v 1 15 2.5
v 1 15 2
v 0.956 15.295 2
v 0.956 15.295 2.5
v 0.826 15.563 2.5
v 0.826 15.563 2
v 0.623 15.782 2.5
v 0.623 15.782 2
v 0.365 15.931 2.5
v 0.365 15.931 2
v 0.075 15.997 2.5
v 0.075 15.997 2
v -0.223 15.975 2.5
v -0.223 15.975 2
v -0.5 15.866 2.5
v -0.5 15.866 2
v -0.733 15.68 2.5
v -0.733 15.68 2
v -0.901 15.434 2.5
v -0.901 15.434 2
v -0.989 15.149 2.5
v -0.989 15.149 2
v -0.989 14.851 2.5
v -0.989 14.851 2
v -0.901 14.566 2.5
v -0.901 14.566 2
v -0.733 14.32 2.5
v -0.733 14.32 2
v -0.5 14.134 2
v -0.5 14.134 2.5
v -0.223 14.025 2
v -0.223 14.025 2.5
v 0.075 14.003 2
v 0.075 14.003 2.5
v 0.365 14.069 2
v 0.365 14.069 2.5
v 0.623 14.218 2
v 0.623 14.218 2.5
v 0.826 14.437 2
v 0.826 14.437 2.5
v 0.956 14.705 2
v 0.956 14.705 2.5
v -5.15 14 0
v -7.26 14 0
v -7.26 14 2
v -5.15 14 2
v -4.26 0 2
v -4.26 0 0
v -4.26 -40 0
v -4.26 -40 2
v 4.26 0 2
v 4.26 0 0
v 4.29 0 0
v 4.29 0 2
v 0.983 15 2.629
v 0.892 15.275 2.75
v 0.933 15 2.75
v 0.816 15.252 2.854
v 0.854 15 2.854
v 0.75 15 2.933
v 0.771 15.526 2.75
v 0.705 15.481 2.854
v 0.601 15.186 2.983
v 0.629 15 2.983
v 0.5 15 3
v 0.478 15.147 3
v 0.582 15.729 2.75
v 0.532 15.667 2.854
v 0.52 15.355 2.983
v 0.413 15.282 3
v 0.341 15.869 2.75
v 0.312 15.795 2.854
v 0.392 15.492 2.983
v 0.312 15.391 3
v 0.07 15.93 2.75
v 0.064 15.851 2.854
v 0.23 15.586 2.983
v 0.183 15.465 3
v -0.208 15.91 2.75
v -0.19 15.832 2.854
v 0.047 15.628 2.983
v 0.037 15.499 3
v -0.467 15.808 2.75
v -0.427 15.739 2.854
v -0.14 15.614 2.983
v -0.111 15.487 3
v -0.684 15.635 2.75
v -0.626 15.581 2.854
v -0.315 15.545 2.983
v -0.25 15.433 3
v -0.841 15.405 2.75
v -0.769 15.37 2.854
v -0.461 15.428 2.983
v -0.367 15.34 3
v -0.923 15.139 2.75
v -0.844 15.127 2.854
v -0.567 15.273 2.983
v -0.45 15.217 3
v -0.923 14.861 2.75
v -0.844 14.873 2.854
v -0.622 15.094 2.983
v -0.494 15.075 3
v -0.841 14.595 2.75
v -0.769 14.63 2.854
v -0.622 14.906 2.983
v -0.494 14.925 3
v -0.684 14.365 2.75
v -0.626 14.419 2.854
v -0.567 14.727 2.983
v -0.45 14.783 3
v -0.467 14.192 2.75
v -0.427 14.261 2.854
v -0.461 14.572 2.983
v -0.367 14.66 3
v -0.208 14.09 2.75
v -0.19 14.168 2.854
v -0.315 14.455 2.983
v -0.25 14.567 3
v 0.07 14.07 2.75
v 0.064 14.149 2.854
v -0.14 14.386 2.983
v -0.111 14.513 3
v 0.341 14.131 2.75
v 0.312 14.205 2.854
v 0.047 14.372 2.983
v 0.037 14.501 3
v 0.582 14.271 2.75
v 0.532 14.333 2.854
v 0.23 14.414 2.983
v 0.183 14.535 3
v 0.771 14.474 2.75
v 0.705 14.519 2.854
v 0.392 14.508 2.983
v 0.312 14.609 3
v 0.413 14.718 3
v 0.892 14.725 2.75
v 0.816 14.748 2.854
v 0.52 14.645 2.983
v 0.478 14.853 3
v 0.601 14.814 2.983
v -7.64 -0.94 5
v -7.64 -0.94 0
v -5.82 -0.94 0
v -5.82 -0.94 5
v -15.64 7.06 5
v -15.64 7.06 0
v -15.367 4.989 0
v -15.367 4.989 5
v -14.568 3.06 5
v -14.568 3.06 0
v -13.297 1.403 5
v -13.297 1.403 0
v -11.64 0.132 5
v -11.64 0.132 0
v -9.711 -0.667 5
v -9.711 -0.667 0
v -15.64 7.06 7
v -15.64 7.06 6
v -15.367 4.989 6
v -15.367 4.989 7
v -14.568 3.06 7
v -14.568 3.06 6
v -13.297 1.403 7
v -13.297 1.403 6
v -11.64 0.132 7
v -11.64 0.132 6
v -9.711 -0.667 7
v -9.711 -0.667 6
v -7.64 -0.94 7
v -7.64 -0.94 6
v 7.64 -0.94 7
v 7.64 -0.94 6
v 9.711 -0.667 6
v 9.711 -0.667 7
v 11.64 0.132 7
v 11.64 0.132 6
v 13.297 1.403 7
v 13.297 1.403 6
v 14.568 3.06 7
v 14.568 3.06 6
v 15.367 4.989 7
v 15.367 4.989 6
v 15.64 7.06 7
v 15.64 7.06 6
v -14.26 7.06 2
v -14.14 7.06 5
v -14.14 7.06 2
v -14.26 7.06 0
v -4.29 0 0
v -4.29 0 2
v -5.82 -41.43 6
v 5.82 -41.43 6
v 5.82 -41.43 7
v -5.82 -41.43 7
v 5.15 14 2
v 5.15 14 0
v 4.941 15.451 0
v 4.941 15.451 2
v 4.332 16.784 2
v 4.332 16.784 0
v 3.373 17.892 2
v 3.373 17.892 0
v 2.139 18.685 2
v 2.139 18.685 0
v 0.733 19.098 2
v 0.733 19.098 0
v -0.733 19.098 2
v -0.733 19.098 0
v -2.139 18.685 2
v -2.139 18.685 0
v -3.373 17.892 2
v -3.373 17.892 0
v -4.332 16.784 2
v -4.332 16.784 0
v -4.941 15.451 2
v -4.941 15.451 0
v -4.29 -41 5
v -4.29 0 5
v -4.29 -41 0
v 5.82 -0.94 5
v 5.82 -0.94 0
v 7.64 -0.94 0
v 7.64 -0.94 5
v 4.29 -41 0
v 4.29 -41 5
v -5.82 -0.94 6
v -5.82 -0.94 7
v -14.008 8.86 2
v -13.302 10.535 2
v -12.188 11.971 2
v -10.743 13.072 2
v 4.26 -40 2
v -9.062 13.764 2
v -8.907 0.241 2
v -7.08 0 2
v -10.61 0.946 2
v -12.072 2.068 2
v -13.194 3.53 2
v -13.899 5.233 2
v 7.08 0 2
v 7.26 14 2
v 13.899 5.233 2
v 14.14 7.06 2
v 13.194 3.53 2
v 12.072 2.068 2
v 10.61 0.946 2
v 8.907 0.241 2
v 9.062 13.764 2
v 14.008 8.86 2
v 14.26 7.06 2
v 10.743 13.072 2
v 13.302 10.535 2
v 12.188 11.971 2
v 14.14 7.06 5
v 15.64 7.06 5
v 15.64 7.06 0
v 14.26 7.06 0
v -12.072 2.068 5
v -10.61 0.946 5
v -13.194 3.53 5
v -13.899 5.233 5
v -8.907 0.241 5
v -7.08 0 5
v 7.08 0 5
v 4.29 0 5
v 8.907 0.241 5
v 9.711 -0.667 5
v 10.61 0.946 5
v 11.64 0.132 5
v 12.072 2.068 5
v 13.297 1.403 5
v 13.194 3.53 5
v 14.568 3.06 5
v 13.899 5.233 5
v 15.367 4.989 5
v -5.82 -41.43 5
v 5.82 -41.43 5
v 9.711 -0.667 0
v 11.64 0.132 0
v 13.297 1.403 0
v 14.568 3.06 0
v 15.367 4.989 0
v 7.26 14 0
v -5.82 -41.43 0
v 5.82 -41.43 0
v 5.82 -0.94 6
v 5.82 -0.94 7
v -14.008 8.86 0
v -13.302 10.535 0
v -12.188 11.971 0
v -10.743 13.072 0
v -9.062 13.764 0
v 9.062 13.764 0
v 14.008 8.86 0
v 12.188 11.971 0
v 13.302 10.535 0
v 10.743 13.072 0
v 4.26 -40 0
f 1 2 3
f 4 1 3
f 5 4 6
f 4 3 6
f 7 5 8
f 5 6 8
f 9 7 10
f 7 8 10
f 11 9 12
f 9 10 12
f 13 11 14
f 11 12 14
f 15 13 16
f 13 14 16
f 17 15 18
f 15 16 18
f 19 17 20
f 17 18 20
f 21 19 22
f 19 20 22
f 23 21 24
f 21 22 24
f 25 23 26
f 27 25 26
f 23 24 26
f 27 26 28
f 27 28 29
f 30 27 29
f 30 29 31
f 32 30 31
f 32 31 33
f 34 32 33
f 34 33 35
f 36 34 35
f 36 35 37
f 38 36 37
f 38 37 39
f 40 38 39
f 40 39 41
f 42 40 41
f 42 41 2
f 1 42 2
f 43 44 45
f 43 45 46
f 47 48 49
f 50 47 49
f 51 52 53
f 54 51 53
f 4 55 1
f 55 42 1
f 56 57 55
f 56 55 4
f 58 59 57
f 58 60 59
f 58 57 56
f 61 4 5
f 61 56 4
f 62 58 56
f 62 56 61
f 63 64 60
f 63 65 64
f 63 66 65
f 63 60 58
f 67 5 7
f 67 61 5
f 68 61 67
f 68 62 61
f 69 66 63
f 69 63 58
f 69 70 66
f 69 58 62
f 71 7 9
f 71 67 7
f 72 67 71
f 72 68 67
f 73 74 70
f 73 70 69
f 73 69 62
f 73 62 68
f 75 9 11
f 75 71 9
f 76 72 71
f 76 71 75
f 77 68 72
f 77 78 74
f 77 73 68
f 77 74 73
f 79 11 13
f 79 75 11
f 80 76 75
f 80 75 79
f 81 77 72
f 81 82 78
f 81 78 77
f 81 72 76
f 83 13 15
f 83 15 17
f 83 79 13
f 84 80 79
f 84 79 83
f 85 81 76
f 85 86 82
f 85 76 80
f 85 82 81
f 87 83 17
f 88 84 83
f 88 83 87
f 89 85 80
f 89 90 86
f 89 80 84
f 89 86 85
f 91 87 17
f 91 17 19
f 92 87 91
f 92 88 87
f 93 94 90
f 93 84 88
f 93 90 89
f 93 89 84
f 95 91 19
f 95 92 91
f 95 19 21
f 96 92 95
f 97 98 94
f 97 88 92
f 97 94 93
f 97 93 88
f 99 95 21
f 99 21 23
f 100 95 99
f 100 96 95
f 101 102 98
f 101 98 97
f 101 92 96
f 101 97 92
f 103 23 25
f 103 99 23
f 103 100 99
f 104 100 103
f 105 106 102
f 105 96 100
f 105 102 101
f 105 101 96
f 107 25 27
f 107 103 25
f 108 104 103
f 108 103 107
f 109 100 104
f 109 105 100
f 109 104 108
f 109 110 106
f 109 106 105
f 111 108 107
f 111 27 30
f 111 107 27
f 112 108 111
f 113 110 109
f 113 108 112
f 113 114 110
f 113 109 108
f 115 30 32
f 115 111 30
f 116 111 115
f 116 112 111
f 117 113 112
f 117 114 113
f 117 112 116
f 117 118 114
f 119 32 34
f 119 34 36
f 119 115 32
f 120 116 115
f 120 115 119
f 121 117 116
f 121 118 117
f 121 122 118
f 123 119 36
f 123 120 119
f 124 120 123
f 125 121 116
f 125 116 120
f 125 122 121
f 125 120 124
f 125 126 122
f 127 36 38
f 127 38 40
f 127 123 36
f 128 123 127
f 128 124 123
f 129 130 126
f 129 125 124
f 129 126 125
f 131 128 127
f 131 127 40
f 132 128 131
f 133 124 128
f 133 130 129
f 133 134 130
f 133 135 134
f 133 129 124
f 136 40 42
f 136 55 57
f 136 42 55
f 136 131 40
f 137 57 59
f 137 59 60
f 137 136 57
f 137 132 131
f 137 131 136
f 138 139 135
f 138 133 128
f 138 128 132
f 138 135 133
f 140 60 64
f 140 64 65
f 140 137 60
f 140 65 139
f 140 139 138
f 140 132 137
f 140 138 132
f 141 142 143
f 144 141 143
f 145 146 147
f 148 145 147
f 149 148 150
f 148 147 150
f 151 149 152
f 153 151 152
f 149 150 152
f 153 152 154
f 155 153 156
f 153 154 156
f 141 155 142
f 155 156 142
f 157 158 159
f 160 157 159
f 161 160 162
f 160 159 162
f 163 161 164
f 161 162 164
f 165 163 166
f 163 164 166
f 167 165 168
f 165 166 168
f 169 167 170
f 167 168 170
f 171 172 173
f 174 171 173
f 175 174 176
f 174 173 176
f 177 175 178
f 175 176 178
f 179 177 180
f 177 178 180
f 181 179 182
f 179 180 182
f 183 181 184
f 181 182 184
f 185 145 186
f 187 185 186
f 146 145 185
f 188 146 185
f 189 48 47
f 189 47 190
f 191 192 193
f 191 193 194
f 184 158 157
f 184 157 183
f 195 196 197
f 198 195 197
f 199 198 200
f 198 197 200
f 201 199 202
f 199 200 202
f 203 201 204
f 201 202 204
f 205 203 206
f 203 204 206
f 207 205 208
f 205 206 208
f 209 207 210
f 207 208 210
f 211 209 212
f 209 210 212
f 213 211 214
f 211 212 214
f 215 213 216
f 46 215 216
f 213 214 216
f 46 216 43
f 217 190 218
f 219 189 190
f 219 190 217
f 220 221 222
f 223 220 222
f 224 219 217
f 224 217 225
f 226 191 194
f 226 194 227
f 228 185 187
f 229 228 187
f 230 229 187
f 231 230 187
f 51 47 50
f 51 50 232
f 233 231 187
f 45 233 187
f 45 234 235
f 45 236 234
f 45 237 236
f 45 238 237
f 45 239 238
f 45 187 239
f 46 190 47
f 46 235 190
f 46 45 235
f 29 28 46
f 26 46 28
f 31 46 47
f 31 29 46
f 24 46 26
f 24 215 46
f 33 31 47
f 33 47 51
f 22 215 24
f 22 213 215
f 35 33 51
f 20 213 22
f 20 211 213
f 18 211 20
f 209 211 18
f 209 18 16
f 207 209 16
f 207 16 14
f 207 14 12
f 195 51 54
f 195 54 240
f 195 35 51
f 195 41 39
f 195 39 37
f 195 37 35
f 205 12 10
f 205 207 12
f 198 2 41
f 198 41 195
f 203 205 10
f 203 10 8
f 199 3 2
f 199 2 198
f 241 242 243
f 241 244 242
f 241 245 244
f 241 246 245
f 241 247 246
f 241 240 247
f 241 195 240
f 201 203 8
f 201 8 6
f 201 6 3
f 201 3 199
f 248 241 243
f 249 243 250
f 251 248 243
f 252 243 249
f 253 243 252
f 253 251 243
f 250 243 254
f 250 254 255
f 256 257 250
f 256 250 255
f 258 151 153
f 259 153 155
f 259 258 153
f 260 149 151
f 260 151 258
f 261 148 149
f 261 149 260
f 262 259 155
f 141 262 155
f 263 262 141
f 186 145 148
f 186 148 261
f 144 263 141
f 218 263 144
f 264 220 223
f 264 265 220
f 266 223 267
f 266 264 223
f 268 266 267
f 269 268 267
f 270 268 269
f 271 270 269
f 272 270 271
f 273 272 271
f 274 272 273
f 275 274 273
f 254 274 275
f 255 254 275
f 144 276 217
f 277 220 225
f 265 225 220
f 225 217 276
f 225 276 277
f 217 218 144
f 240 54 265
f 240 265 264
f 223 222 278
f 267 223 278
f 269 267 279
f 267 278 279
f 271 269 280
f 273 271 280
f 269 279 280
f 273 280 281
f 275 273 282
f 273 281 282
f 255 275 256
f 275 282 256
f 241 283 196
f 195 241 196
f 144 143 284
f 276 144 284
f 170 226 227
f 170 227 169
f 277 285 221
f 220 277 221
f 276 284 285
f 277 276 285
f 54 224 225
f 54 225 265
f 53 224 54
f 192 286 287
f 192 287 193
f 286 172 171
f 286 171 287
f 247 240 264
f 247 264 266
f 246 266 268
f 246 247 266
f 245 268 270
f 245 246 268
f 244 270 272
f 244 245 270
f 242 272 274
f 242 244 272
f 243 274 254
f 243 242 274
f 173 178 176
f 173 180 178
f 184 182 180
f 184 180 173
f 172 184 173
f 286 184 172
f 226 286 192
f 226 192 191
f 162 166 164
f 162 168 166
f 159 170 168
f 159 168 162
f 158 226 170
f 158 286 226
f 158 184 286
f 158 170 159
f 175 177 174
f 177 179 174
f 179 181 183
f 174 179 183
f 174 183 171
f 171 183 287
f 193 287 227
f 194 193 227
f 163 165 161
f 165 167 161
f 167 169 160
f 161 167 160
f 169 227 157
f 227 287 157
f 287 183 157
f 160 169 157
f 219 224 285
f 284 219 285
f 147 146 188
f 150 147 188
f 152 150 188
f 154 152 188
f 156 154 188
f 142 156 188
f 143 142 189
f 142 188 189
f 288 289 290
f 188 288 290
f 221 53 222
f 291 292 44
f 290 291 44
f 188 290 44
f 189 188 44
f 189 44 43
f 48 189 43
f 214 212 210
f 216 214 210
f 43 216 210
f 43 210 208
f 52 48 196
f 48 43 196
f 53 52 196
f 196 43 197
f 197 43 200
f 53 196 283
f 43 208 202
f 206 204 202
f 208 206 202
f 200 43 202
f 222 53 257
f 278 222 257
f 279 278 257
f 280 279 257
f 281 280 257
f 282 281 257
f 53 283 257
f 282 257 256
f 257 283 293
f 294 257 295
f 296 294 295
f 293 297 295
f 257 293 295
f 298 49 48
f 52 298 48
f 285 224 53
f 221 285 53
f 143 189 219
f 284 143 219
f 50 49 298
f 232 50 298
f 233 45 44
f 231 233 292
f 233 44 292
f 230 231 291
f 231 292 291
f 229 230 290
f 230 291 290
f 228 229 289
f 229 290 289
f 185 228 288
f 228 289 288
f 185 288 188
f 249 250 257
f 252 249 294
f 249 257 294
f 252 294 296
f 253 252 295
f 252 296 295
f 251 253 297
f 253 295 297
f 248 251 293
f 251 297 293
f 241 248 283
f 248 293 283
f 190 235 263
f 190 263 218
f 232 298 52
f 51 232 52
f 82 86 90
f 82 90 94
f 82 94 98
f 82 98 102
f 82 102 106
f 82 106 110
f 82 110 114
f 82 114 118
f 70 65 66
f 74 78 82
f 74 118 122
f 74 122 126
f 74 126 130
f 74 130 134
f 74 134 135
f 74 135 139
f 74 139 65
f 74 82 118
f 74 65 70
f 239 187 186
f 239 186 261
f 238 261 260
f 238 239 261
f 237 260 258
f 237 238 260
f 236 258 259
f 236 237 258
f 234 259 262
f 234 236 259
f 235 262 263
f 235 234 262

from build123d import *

# Parameters (mm, degrees)
PAD_DEPTH    = 5
PAD001_DEPTH = 2
SKETCH003_R  = 1
PAD003_DEPTH = 2
FILLET_R     = 0.5
PAD002_DEPTH = 1


with BuildPart() as body_key_holder_id_badge:
    # Sketch001 → Pad (new body)
    with BuildSketch(Plane.XY):
        with BuildLine():
            ThreePointArc((-15.64, 7.06), (-13.296854, 1.403146), (-7.64, -0.94))
            Line((-7.64, -0.94), (-5.82, -0.94))
            Line((-5.82, -0.94), (-5.82, -41.43))
            Line((-5.82, -41.43), (5.82, -41.43))
            Line((5.82, -41.43), (5.82, -0.94))
            Line((5.82, -0.94), (7.64, -0.94))
            ThreePointArc((7.64, -0.94), (13.296854, 1.403146), (15.64, 7.06))
            Line((14.14, 7.06), (15.64, 7.06))
            ThreePointArc((7.08, 0), (12.072174, 2.067826), (14.14, 7.06))
            Line((4.29, 0), (7.08, 0))
            Line((4.29, -41), (4.29, 0))
            Line((-4.29, -41), (4.29, -41))
            Line((-4.29, 0), (-4.29, -41))
            Line((-7.08, 0), (-4.29, 0))
            ThreePointArc((-14.14, 7.06), (-12.072174, 2.067826), (-7.08, 0))
            Line((-15.64, 7.06), (-14.14, 7.06))
        make_face()
    extrude(amount=PAD_DEPTH)

    # Sketch → Pad001 (join)
    with BuildSketch(Plane.XY):
        with BuildLine():
            Line((-4.26, 0), (-4.26, -40))
            Line((-4.26, -40), (4.26, -40))
            Line((4.26, -40), (4.26, 0))
            Line((4.26, 0), (7.26, 0))
            ThreePointArc((7.26, 0), (14.26, 6.99999), (7.260019, 14))
            Line((7.260019, 14), (5.15, 14))
            ThreePointArc((5.15, 14), (0, 19.15), (-5.15, 14))
            Line((-7.260027, 14), (-5.15, 14))
            ThreePointArc((-7.260027, 14), (-14.26, 6.999986), (-7.26, 0))
            Line((-4.26, 0), (-7.26, 0))
        make_face()
    extrude(amount=PAD001_DEPTH)

    # Sketch003 → Pad003 (join)
    with BuildSketch(Plane.XY.offset(1)):
        with Locations((0, 15)):
            Circle(SKETCH003_R)
    extrude(amount=PAD003_DEPTH)

    # Fillet
    fillet_edges = [body_key_holder_id_badge.edges().sort_by_distance(p)[0] for p in [
        (-1, 15, 3),
    ]]
    fillet(fillet_edges, radius=FILLET_R)


with BuildPart() as body_top:
    # Sketch005 → Pad002 (new body)
    with BuildSketch(Plane.XY.offset(6)):
        with BuildLine():
            Line((-15.64, 7.06), (15.64, 7.06))
            ThreePointArc((7.64, -0.94), (13.296854, 1.403146), (15.64, 7.06))
            Line((7.64, -0.94), (5.82, -0.94))
            Line((5.82, -0.94), (5.82, -41.43))
            Line((5.82, -41.43), (-5.82, -41.43))
            Line((-5.82, -41.43), (-5.82, -0.94))
            Line((-5.82, -0.94), (-7.64, -0.94))
            ThreePointArc((-15.64, 7.06), (-13.296854, 1.403146), (-7.64, -0.94))
        make_face()
    extrude(amount=PAD002_DEPTH)


solid = Compound([body_key_holder_id_badge.part, body_top.part])
